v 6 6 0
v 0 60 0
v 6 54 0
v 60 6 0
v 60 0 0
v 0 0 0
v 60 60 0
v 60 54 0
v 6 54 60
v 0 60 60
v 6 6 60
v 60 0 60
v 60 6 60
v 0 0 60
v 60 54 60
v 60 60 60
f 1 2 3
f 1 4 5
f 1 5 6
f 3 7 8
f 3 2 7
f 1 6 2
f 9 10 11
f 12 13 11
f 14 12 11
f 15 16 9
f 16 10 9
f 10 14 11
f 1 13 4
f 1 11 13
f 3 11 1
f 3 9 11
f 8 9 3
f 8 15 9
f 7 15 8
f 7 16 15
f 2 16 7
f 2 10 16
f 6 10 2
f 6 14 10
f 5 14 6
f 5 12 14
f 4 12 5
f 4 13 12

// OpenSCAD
$fn = 32;

// ----------------------------------------------------------------------
// Structural section: channel 60 x 60 mm
// ----------------------------------------------------------------------

// --- parameters (mm) ---
sec_w = 60;               // channel width, X
sec_h = 60;               // channel height, Y
flange_t = 6;             // flange thickness
web_t = 6;                // web thickness
plate_t = 60;             // cut length, Z (extrusion height)

profile = [[0, 0], [60, 0], [60, 6], [6, 6], [6, 54], [60, 54], [60, 60], [0, 60]];  // primary outline, 8 points, counter clockwise

// --- the one profile operation ---
linear_extrude(height = plate_t) polygon(points = profile);
